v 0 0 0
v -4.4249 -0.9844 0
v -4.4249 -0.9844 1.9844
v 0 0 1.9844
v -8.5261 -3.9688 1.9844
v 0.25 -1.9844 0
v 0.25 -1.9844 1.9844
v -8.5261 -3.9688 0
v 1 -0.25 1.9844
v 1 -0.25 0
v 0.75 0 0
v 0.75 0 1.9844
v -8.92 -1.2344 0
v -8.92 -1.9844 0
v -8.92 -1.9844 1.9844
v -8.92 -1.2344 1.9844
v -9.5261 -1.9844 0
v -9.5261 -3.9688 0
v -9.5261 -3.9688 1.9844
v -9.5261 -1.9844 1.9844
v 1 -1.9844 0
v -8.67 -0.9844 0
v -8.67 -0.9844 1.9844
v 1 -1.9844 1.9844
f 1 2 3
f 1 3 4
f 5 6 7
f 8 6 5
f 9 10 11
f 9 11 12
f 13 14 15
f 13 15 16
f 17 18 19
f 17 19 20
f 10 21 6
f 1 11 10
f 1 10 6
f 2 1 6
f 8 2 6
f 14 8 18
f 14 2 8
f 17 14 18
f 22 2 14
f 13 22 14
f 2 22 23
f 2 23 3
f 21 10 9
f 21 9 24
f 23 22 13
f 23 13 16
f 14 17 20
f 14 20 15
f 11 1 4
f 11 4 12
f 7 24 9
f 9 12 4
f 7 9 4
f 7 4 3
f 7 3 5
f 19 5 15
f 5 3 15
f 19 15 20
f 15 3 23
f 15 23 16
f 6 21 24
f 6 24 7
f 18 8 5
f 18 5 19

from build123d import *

# Parameters (mm, degrees)
BOSS_EXTRUDE1_DEPTH = 1.984375
CHAMFER1_SIZE       = 0.25


with BuildPart() as part:
    # Sketch1 → Boss-Extrude1 (new body)
    with BuildSketch(Plane.XY):
        Polygon((0, 0), (1, 0), (1, -1.984375), (0.25, -1.984375), (-8.526125475, -3.96875), (-9.526125475, -3.96875), (-9.526125475, -1.984375), (-8.92, -1.984375), (-8.92, -0.984375), (-4.42488189, -0.984375), align=None)
    extrude(amount=BOSS_EXTRUDE1_DEPTH)

    # Chamfer1
    chamfer1_edges = [part.edges().sort_by_distance(p)[0] for p in [
        (1, 0, 0.9921875),
        (-8.92, -0.984375, 0.9921875),
    ]]
    chamfer(chamfer1_edges, length=CHAMFER1_SIZE)


solid = part.part
